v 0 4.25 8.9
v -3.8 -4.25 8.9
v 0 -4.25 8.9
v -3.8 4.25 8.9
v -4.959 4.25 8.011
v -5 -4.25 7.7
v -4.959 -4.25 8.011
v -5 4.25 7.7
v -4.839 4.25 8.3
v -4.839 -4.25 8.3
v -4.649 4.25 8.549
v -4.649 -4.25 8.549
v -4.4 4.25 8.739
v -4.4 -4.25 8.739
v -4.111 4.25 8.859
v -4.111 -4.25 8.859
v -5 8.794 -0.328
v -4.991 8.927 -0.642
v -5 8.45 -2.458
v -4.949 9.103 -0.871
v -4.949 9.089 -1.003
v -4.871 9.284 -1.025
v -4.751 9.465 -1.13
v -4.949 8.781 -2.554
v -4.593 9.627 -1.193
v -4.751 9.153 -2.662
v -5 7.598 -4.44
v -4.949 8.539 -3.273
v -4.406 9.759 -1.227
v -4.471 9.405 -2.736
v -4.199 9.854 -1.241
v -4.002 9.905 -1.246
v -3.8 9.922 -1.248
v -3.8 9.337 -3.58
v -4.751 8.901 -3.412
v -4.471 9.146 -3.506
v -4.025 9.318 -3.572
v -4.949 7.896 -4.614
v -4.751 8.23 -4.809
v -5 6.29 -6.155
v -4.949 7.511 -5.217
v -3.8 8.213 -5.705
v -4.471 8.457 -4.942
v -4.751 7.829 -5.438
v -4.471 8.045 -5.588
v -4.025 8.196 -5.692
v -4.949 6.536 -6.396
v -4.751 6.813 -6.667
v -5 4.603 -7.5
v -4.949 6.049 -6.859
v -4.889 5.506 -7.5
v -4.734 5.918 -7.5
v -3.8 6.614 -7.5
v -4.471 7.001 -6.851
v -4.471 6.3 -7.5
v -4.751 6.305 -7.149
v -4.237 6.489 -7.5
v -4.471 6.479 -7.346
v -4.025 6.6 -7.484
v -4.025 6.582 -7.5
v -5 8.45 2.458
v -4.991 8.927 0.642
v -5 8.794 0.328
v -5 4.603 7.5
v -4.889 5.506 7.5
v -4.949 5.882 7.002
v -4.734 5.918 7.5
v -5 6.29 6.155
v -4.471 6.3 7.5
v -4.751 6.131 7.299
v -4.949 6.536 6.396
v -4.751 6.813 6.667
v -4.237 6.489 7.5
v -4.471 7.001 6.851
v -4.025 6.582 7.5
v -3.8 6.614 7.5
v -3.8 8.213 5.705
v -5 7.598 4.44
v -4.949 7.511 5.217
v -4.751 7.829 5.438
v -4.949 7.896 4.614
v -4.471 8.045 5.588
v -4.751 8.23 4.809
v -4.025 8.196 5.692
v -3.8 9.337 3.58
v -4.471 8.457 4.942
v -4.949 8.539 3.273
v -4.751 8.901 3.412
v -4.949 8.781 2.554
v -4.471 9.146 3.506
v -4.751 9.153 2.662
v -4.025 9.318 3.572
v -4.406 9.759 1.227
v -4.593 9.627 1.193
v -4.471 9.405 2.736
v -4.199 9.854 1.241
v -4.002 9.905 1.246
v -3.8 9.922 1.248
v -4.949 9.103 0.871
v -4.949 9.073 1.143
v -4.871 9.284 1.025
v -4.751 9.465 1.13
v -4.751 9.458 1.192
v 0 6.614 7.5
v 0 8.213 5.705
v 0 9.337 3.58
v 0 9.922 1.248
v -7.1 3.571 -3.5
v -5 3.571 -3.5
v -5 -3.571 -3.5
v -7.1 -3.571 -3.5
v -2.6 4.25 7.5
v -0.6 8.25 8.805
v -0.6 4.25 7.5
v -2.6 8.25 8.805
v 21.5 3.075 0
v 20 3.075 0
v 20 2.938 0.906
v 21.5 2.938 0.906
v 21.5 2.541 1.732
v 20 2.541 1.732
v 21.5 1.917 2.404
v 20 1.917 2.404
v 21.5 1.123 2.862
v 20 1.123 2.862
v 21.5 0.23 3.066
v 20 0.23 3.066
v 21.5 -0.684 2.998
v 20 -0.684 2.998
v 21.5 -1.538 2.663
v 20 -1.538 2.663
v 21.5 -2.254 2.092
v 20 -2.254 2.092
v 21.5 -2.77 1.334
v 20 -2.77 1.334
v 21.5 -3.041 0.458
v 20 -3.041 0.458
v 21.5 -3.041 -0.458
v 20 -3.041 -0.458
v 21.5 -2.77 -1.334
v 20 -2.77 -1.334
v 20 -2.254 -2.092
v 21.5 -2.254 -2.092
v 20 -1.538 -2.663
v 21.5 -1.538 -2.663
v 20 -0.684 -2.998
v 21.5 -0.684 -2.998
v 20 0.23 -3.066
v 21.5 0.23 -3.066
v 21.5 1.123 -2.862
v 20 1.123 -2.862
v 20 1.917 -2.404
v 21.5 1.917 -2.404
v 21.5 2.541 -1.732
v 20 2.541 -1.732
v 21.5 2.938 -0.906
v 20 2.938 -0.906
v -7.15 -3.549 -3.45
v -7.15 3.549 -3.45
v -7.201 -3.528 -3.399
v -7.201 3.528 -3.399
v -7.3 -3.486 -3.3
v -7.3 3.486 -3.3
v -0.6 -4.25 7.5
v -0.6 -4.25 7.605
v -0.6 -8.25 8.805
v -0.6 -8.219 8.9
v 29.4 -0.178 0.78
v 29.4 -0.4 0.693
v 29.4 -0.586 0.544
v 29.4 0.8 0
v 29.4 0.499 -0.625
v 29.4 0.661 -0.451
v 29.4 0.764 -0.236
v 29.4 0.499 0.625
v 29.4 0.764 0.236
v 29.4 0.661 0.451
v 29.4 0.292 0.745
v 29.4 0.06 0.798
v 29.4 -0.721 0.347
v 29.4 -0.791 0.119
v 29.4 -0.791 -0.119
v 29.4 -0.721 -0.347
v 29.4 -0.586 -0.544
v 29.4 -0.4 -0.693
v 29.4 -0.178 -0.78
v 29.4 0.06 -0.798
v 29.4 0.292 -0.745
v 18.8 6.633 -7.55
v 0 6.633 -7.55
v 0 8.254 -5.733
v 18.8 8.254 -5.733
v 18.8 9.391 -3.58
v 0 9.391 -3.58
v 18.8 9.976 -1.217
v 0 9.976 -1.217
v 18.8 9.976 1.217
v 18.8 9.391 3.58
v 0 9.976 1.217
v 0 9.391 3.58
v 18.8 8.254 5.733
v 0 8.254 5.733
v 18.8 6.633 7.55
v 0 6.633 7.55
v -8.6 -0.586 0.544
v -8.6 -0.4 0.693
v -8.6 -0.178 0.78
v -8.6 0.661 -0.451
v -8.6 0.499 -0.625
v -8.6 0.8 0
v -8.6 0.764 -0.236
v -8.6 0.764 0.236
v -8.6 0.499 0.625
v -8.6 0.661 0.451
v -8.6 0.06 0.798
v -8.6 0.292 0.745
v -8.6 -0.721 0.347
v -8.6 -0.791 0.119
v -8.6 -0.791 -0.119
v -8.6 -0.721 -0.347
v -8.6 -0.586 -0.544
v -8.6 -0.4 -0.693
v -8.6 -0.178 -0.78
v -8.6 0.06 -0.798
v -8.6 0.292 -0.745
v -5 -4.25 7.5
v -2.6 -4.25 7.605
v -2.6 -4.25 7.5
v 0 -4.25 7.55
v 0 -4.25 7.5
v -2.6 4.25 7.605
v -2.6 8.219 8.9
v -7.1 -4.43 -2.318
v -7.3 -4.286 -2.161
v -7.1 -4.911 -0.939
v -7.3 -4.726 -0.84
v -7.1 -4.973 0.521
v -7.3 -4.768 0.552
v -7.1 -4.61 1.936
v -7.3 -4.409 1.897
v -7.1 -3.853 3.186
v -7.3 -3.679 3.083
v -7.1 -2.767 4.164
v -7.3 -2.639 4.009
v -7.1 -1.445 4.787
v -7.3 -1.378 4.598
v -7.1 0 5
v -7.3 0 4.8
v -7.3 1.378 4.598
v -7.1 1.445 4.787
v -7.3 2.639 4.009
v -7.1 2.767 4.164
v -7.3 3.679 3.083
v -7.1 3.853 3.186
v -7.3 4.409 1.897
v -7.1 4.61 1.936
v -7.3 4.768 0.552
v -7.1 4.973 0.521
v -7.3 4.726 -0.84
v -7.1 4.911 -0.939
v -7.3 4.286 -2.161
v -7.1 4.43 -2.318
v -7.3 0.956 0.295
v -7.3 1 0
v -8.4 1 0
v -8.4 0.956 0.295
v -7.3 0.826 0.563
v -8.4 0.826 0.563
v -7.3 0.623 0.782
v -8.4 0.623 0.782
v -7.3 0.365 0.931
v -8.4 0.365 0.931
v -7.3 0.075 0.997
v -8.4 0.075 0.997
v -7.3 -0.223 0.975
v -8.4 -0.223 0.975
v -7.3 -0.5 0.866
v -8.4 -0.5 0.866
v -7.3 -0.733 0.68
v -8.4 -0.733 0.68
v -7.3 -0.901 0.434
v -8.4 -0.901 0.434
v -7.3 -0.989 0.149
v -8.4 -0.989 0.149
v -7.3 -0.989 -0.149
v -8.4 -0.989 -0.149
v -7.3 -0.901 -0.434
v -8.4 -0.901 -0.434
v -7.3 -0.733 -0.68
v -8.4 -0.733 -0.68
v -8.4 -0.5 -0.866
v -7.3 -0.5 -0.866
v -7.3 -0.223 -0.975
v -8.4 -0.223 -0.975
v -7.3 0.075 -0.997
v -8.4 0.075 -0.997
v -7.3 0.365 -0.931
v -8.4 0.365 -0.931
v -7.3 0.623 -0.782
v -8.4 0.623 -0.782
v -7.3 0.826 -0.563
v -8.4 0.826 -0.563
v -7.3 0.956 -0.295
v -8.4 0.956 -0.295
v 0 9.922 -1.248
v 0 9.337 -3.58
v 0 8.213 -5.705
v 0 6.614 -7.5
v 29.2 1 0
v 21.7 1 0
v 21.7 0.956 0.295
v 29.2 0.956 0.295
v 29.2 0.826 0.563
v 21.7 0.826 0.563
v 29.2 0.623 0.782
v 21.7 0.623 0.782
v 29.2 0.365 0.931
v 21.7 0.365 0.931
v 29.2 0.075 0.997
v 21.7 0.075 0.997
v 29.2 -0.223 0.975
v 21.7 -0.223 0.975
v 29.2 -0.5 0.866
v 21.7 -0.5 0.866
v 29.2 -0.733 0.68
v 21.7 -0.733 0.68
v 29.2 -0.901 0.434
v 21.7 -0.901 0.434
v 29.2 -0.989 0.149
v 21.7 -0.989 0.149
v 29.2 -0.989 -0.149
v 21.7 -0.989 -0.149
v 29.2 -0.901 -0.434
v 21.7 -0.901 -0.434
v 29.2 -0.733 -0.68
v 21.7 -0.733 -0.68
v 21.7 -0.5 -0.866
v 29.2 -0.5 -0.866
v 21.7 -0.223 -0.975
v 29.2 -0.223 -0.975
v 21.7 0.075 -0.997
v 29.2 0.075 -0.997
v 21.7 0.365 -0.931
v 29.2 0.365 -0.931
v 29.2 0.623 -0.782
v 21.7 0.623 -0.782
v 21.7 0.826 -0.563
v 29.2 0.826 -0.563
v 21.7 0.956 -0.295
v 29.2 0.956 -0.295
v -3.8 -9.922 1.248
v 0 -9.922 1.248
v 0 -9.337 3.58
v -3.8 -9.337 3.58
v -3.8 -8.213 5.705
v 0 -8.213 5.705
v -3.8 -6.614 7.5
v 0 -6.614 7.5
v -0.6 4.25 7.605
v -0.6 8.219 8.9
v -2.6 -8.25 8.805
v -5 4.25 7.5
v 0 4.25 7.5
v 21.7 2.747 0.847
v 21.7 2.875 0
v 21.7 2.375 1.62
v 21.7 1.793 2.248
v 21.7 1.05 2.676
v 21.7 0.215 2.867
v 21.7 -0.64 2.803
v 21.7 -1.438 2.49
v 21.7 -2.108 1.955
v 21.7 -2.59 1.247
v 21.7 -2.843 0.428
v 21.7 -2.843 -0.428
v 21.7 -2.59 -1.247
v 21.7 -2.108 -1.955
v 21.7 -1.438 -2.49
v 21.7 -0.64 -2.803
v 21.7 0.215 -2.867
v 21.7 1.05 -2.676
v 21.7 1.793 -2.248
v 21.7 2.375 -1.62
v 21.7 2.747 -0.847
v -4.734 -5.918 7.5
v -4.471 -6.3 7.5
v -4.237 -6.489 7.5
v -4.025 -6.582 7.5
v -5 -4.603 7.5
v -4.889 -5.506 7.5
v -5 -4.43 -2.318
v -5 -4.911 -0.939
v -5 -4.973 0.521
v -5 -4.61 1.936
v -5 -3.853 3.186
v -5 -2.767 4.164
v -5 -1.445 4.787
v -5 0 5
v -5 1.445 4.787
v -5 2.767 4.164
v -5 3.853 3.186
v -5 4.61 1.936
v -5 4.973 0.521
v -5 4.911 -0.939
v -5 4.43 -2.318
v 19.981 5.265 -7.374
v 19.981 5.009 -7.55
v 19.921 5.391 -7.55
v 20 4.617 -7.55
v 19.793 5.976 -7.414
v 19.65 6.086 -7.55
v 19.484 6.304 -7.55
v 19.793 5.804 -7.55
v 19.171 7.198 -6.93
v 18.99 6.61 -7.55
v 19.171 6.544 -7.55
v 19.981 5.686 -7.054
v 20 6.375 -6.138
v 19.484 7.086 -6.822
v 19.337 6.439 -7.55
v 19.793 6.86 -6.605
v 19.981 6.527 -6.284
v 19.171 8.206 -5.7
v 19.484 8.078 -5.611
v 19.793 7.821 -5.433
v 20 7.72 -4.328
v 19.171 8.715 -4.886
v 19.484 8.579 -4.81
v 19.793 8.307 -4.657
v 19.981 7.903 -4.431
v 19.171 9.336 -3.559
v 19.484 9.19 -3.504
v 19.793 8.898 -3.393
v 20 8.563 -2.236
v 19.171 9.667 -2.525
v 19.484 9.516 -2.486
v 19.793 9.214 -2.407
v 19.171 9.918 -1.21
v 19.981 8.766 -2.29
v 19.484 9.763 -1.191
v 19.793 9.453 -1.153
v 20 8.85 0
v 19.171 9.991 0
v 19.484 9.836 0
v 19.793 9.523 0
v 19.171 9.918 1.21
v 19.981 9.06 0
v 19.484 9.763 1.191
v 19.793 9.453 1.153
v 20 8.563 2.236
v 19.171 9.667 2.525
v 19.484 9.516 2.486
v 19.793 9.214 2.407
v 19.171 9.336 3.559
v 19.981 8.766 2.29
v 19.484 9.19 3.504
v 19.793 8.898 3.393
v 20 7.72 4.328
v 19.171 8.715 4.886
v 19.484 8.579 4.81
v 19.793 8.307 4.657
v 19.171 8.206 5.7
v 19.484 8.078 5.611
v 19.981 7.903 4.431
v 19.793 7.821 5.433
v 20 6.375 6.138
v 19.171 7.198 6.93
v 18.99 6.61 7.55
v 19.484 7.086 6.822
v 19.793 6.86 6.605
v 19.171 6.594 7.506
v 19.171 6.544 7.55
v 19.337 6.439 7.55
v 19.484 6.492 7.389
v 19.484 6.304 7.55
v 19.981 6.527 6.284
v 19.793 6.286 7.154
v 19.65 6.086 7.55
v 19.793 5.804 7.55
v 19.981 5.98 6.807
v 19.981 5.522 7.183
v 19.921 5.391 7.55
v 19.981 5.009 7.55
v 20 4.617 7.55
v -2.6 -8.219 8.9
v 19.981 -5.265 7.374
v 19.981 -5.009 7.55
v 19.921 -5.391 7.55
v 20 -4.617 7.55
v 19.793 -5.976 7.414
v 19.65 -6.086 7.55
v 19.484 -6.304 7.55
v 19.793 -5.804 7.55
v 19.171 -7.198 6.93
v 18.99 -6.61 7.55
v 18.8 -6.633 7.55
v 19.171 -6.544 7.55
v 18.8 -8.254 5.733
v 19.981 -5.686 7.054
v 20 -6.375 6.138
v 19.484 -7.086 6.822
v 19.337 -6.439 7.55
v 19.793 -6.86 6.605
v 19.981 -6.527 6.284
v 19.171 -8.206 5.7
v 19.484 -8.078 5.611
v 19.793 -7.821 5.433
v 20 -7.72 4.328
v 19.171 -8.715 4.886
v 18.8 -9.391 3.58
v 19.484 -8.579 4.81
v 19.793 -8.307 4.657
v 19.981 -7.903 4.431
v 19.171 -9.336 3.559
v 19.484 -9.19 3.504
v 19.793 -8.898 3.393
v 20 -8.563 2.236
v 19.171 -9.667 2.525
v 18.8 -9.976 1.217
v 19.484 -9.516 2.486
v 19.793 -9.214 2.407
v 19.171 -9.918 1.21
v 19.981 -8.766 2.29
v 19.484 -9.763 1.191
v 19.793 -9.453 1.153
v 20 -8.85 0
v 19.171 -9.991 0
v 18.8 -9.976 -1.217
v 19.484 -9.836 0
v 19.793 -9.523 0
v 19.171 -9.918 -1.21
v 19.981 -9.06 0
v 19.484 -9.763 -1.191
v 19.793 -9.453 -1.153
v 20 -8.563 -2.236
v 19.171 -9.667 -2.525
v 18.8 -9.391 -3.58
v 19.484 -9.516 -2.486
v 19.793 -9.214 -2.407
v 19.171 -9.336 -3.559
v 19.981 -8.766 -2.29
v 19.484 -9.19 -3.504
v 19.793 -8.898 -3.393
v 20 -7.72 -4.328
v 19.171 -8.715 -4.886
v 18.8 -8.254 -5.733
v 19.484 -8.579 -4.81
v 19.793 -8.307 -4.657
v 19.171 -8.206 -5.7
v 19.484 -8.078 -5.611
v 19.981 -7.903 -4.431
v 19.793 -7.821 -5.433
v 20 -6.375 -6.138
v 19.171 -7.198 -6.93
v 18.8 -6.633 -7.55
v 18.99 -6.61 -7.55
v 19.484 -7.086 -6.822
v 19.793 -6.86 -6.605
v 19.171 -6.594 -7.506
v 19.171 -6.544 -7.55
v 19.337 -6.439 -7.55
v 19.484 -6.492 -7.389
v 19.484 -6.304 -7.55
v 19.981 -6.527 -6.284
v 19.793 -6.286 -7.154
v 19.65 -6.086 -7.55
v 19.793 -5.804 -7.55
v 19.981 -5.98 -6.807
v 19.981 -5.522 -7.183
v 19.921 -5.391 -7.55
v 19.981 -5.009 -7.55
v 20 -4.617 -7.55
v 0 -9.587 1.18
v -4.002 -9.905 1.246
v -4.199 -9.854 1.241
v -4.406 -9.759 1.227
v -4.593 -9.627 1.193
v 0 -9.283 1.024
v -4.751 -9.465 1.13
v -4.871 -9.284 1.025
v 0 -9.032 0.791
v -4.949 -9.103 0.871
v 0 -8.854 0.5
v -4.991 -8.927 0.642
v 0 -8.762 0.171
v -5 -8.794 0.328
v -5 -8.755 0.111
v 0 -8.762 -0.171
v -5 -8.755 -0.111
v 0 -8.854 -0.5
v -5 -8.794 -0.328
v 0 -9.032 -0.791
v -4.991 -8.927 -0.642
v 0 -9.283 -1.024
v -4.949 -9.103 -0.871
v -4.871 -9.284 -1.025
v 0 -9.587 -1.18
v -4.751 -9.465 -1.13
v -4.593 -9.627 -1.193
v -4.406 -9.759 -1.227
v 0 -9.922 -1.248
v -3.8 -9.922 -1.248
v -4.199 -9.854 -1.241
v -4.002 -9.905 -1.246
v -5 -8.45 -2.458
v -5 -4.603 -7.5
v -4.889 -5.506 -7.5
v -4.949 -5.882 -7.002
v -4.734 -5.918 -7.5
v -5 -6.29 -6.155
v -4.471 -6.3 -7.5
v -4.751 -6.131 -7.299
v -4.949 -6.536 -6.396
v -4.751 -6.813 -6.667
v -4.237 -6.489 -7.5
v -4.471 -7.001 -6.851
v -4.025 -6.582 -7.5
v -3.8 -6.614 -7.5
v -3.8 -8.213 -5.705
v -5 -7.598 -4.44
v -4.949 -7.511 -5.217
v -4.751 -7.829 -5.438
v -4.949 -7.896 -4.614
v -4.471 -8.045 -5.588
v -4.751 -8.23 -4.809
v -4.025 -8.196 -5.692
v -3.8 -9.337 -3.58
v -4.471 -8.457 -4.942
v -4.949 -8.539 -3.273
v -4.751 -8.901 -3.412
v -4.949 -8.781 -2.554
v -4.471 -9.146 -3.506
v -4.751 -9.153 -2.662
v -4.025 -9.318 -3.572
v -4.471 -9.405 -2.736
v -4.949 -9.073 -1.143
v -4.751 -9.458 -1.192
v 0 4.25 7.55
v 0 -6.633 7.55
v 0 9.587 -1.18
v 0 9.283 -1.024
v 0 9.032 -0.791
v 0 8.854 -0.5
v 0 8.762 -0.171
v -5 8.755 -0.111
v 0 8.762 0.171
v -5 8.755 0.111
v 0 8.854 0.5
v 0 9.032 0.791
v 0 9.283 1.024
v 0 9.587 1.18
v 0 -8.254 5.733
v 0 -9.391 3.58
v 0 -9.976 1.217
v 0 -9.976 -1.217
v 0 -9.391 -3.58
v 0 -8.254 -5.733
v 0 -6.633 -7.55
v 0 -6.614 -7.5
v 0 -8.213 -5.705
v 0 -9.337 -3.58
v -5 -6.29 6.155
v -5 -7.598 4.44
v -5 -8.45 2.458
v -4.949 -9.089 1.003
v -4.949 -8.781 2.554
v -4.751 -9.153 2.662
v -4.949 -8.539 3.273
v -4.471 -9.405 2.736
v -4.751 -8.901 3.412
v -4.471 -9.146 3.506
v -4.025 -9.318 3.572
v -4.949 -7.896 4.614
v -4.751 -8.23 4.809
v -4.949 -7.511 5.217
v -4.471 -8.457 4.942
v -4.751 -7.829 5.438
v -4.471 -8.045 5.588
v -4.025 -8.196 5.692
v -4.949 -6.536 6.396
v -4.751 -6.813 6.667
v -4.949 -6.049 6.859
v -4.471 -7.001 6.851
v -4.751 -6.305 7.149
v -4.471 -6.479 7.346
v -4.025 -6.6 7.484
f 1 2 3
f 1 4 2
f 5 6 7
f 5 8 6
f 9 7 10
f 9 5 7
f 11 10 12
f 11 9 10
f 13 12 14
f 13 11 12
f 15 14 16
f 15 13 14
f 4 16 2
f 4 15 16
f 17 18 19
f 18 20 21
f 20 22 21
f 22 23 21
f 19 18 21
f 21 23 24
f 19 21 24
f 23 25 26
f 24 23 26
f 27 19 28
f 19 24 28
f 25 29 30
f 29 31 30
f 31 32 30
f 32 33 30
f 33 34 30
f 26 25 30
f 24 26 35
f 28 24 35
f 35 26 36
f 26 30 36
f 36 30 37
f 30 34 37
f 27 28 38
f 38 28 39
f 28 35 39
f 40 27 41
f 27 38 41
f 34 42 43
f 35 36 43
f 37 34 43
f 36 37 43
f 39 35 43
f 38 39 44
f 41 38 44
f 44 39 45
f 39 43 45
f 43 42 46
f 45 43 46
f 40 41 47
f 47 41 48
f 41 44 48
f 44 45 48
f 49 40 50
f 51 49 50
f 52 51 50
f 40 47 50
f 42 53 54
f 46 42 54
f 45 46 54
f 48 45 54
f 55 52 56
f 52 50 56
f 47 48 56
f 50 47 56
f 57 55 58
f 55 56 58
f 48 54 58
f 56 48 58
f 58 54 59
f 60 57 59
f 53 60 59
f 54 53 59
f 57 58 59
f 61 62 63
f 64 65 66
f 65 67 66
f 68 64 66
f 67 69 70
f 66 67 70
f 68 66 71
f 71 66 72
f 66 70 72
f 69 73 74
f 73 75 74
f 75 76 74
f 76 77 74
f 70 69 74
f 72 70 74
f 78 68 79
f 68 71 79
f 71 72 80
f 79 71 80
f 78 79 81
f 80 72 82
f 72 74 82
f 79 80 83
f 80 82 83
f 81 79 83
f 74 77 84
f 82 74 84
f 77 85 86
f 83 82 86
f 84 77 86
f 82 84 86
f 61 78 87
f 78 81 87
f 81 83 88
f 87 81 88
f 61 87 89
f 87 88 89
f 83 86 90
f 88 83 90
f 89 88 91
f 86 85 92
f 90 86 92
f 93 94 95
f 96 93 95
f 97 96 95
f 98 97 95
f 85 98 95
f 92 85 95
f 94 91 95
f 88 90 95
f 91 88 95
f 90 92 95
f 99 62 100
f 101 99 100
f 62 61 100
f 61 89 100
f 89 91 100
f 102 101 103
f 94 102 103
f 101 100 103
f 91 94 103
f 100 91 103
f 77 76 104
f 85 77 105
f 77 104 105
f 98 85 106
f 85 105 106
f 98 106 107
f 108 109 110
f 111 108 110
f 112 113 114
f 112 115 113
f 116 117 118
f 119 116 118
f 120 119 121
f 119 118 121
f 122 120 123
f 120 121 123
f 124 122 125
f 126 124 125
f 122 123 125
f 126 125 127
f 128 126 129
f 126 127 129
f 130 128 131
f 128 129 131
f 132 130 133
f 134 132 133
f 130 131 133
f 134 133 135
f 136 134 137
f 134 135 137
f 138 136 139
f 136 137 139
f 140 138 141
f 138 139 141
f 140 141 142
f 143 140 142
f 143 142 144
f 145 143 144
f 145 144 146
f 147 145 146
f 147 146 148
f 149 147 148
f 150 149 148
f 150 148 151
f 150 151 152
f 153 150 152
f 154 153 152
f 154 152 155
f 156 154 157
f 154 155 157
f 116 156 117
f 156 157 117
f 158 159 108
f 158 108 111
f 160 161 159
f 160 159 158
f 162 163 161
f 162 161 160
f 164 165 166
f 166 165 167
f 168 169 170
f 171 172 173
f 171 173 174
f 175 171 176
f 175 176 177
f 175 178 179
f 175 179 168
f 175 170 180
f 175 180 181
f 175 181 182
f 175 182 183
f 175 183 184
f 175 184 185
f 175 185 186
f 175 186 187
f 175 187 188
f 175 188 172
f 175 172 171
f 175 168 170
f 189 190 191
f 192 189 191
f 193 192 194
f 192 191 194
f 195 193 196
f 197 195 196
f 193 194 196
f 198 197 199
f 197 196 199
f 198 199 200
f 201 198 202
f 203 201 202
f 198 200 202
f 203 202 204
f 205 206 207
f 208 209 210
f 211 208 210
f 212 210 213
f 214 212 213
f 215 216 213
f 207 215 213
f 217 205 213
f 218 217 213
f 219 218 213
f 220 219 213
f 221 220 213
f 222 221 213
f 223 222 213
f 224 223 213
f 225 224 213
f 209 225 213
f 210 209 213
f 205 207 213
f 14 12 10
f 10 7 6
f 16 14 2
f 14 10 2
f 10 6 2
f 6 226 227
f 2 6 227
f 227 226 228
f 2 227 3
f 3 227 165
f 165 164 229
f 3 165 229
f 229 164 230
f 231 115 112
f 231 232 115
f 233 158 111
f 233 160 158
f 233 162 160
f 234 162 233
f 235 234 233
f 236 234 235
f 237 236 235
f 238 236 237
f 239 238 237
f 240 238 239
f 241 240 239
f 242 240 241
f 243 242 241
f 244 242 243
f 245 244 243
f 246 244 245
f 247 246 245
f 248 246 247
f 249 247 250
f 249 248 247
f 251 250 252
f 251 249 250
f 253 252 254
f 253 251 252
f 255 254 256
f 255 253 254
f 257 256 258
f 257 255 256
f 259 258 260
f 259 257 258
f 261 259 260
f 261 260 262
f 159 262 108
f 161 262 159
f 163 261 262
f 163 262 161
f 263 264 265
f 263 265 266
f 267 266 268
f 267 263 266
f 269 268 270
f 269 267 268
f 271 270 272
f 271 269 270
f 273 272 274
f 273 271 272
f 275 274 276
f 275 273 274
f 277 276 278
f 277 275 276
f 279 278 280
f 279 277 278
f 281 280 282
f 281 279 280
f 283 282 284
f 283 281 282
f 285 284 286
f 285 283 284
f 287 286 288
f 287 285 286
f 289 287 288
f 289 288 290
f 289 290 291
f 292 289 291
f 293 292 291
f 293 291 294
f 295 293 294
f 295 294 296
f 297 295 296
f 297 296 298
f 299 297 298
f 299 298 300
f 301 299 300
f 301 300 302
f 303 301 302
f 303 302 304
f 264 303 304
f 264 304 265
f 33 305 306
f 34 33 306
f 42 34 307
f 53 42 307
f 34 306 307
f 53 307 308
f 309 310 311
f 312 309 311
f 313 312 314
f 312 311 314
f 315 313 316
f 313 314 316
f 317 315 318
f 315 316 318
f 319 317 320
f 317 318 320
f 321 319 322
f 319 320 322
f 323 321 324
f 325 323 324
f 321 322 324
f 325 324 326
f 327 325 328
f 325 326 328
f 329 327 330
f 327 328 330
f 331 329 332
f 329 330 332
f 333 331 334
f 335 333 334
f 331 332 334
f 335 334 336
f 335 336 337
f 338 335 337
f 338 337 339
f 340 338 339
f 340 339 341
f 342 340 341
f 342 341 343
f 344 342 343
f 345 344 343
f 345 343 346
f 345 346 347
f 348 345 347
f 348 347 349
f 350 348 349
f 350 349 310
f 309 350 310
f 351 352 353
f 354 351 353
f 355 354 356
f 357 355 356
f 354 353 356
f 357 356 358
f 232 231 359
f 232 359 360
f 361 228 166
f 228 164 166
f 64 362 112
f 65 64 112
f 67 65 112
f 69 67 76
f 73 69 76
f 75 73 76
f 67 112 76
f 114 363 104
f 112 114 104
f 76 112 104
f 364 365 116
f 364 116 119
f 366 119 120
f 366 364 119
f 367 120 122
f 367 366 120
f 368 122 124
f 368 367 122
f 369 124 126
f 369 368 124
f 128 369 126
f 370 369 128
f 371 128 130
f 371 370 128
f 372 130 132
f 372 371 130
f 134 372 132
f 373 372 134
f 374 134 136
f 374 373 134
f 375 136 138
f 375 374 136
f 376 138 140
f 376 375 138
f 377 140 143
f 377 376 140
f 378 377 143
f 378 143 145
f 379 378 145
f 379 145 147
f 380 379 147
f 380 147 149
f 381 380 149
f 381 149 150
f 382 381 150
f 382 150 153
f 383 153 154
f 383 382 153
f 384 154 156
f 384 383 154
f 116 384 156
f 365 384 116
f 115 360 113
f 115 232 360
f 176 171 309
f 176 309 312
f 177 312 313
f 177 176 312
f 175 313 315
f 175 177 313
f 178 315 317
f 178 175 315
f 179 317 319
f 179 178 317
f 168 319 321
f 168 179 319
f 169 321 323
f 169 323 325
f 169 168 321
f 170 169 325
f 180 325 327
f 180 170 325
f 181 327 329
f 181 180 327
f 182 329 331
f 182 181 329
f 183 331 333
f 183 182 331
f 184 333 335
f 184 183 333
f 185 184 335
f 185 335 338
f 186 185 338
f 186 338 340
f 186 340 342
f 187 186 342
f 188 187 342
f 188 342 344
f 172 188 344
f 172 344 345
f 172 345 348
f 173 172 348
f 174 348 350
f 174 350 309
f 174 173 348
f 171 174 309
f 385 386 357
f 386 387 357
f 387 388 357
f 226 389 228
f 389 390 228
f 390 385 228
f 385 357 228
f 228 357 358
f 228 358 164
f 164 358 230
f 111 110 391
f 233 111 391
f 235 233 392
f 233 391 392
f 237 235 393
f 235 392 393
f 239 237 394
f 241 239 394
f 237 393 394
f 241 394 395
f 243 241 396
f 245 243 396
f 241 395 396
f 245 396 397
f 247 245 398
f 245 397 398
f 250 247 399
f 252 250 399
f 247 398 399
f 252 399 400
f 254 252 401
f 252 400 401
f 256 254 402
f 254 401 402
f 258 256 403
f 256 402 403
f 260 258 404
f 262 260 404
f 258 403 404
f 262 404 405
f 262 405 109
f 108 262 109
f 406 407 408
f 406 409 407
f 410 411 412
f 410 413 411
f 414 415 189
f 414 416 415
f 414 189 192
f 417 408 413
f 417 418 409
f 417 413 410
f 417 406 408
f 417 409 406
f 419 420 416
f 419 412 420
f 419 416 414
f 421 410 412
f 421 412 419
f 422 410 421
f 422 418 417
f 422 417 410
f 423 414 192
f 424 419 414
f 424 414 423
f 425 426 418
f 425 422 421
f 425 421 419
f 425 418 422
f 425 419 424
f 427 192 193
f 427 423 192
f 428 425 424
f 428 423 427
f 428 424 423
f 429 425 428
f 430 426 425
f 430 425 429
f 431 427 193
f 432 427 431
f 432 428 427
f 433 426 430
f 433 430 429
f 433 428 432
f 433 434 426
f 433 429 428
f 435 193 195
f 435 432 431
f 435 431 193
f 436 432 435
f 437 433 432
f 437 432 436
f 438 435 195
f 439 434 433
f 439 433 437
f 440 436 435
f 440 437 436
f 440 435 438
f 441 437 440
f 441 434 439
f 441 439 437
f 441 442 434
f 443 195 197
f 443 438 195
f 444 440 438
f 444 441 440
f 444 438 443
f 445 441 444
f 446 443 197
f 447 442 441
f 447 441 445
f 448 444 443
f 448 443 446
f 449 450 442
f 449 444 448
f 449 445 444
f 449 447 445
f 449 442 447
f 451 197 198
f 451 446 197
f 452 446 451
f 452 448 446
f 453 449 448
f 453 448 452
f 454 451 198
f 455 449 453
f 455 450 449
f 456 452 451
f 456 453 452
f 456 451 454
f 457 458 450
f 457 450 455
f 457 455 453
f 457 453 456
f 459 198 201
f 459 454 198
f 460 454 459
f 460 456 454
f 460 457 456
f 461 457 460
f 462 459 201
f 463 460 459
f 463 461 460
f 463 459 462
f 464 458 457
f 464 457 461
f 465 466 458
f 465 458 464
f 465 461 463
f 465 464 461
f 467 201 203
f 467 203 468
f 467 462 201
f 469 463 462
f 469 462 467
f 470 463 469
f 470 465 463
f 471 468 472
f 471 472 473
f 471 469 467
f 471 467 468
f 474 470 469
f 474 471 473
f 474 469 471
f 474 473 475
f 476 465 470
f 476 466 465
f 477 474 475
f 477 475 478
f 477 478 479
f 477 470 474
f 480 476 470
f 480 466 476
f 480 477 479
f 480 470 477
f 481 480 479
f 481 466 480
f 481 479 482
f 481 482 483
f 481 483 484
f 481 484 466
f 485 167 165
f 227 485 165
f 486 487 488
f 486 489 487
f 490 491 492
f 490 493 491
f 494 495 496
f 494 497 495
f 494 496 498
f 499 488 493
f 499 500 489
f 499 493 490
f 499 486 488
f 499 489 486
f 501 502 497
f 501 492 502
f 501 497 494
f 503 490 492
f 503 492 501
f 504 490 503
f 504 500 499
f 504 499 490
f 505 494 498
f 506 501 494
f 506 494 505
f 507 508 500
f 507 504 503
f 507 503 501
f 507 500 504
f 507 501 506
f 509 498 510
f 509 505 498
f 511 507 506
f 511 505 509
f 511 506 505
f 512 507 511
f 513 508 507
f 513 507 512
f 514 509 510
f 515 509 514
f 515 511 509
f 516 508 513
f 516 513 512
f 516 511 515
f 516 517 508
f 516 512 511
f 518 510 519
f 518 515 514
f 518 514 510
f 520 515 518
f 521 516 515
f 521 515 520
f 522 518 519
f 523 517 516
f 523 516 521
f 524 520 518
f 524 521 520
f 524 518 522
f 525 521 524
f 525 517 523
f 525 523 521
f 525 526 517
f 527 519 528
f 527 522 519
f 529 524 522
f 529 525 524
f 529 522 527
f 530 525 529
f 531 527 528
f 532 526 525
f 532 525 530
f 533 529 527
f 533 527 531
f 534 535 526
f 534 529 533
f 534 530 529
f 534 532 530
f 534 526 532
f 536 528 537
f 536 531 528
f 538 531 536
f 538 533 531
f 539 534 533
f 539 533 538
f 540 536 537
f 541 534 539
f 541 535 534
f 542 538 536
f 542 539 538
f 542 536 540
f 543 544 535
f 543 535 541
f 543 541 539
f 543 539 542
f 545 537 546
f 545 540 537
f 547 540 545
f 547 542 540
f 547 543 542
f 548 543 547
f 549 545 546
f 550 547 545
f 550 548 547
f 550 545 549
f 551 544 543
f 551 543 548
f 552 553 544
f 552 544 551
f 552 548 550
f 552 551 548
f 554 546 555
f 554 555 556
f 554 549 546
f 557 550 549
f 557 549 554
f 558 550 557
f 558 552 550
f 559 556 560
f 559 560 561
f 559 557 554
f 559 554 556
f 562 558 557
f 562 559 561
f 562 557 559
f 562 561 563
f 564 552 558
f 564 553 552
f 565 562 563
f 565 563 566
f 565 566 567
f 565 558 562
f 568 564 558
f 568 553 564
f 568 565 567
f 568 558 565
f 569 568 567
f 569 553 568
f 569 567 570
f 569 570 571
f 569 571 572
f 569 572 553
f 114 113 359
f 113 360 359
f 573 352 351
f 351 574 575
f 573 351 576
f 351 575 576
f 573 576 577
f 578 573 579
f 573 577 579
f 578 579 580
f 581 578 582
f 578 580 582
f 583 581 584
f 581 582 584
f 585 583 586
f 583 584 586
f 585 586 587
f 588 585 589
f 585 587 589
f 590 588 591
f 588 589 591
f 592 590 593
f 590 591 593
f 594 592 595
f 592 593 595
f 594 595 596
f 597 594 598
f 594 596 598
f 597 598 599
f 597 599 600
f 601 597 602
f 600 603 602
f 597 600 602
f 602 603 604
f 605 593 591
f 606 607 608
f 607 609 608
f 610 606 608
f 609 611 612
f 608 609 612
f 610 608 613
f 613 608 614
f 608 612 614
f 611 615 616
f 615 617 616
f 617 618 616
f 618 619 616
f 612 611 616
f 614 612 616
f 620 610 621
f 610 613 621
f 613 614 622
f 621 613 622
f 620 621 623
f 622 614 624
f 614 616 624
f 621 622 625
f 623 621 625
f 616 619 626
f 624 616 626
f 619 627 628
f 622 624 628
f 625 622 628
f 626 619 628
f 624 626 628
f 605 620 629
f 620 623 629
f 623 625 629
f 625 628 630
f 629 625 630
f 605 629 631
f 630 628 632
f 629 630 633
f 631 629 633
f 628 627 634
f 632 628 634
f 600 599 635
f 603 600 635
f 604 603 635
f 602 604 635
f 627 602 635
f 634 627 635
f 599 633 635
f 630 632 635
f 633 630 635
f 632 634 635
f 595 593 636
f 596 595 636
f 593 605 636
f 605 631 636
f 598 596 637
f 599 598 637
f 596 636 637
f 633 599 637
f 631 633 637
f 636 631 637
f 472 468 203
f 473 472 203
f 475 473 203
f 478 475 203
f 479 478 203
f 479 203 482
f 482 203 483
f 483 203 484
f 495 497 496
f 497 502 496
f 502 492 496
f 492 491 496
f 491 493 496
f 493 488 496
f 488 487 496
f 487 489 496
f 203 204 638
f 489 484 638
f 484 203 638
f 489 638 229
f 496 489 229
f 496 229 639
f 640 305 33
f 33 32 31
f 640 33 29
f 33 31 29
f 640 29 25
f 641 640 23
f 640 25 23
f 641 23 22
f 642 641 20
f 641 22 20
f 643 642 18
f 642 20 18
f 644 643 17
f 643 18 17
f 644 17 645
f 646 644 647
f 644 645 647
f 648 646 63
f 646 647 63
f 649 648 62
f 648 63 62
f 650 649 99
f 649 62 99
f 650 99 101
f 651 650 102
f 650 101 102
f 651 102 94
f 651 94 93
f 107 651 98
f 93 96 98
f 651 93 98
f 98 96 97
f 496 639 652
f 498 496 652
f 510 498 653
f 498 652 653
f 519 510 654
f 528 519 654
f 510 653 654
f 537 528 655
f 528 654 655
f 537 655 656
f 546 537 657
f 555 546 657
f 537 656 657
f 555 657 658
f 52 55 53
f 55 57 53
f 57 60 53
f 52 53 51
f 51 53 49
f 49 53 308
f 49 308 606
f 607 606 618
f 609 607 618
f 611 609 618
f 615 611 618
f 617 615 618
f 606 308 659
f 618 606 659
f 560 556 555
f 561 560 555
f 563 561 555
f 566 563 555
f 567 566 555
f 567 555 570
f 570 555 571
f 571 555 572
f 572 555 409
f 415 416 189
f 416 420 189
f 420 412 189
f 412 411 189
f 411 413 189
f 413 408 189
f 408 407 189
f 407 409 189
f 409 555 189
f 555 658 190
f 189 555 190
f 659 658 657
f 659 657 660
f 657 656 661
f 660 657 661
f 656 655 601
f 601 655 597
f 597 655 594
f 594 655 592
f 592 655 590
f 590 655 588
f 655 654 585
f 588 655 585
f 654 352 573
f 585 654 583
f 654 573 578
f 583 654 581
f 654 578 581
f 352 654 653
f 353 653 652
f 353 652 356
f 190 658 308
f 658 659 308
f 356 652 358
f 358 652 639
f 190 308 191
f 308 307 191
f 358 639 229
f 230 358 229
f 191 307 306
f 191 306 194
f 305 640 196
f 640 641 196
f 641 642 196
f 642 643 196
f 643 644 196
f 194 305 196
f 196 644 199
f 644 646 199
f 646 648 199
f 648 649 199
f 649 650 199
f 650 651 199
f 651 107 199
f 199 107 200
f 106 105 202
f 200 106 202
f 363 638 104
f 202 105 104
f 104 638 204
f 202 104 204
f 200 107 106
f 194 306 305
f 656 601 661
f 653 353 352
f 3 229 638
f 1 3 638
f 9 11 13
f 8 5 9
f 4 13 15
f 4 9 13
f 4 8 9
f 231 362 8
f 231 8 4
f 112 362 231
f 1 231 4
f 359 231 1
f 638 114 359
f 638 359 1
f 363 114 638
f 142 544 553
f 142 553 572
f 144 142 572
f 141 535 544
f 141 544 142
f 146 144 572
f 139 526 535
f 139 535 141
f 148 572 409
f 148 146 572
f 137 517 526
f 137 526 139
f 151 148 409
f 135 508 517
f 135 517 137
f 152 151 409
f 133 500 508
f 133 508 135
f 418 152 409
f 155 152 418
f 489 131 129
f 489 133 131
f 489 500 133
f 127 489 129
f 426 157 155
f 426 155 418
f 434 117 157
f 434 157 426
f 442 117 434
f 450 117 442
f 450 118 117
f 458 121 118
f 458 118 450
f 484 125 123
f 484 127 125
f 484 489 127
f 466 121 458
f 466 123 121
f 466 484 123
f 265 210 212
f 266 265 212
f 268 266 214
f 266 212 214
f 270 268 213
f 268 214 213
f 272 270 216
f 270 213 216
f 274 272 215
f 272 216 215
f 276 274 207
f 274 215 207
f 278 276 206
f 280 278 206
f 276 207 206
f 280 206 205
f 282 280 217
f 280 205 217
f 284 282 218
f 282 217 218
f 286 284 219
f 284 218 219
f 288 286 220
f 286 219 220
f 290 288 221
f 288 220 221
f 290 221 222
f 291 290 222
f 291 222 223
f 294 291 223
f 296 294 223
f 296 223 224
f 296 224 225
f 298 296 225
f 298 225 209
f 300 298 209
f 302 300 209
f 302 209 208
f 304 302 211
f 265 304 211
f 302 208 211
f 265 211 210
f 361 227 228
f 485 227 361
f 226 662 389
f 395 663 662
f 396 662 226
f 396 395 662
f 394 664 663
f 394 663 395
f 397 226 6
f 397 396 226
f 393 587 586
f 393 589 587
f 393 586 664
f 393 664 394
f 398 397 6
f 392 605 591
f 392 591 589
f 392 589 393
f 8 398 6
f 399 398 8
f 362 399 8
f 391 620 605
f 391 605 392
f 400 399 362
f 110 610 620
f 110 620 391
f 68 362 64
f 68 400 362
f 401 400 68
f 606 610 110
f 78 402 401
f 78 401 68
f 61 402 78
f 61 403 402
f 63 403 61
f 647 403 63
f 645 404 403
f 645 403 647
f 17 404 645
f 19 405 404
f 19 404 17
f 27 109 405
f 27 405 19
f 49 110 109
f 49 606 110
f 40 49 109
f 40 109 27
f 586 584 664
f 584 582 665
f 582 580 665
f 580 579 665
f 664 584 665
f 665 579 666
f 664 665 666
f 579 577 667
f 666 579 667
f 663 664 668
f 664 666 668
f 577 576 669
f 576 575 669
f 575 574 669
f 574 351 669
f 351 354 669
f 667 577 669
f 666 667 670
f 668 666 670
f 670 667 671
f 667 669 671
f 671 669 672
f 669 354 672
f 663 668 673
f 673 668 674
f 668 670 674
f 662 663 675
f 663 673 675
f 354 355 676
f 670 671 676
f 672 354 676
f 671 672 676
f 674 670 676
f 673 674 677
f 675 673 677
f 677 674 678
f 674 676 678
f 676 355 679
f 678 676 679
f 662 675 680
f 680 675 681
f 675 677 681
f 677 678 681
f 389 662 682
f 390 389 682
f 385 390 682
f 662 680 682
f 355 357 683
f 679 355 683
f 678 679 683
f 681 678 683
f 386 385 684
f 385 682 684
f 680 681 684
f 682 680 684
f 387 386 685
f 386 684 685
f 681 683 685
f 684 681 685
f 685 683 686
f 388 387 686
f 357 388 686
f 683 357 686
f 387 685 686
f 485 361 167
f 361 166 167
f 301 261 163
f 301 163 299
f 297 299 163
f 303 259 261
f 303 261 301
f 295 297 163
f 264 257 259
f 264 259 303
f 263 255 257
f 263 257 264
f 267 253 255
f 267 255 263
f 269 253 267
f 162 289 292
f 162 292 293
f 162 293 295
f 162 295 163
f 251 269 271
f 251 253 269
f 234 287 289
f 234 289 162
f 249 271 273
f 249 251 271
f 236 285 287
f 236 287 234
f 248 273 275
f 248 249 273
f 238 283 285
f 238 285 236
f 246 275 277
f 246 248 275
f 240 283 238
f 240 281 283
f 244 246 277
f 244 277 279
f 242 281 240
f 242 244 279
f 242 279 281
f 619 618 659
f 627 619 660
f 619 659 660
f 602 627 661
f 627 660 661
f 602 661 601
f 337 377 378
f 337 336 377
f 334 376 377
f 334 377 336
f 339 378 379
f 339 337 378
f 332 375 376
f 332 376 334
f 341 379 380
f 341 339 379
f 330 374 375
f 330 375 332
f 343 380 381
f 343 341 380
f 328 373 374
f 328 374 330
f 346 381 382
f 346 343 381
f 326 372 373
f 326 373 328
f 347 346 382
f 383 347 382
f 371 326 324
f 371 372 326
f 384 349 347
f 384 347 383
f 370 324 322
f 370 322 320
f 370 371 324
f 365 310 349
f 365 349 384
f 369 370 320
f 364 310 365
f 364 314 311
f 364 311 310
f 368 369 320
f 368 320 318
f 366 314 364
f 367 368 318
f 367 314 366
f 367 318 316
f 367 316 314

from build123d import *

# Parameters (mm, degrees)
F1_DEPTH       = 20
F2_R           = 3.075
F3_DEPTH       = 1.7
F5_DEPTH       = 5
F6_W           = 5
F6_H           = 8.5
F7_DEPTH       = 1.4
F10_DEPTH      = 1
F12_DEPTH      = 2.3
F13_R          = 1
F14_DEPTH      = 9.4
F14_DEPTH_BACK = 28.6
F15_R          = 1.2
F16_SIZE       = 0.2
F18_DEPTH      = 5


with BuildPart() as f1:
    # F0 (on Right) → F1 (new body)
    with BuildSketch(Plane.YZ):
        with BuildLine():
            Line((6.6332495807, 7.55), (-6.6332495807, 7.55))
            ThreePointArc((-6.6332495807, 7.55), (-10.05, 0), (-6.6332495807, -7.55))
            Line((-6.6332495807, -7.55), (6.6332495807, -7.55))
            ThreePointArc((6.6332495807, -7.55), (10.05, 0), (6.6332495807, 7.55))
        make_face()
    extrude(amount=F1_DEPTH)

    # F2 (on face) → F3 (join)
    with BuildSketch(Plane.YZ.offset(20)):
        Circle(F2_R)
    extrude(amount=F3_DEPTH)

    # F4 (on face) → F5 (join)
    with BuildSketch(Plane(origin=(0, 0, 0), x_dir=(0, -1, 0), z_dir=(-1, 0, 0))):
        with BuildLine():
            Line((6.6143782777, 7.5), (-6.6143782777, 7.5))
            ThreePointArc((-6.6143782777, 7.5), (-10, 0), (-6.6143782777, -7.5))
            Line((-6.6143782777, -7.5), (6.6143782777, -7.5))
            ThreePointArc((6.6143782777, -7.5), (10, 0), (6.6143782777, 7.5))
        make_face()
    extrude(amount=F5_DEPTH)

    # F6 (on face) → F7 (join)
    with BuildSketch(Plane.XY.offset(7.5)):
        with Locations((-2.5, 0)):
            Rectangle(F6_W, F6_H)
    extrude(amount=F7_DEPTH)

    # F9 (on offset) → F10 (join, symmetric)
    with BuildSketch(Plane(origin=(-1.6, 0, 0), x_dir=(0, -1, 0), z_dir=(-1, 0, 0))):
        Polygon((4.25, 7.6051868729), (4.25, 7.5), (8.25, 8.8049311029), (8.2189854098, 8.9), align=None)
        Polygon((-8.25, 8.8049311029), (-4.25, 7.5), (-4.25, 7.6051868729), (-8.2189854098, 8.9), align=None)
    extrude(amount=F10_DEPTH, both=True)

    # F11 (on face) → F12 (join)
    with BuildSketch(Plane(origin=(-5, 0, 0), x_dir=(0, -1, 0), z_dir=(-1, 0, 0))):
        with BuildLine():
            Line((-3.5707142143, -3.5), (3.5707142143, -3.5))
            ThreePointArc((3.5707142143, -3.5), (0, 5), (-3.5707142143, -3.5))
        make_face()
    extrude(amount=F12_DEPTH)

    # F13 (on face) → F14 (join, two sides)
    with BuildSketch(Plane.YZ.offset(20)) as f14_sk:
        Circle(F13_R)
    extrude(amount=F14_DEPTH)
    extrude(f14_sk.sketch, amount=-F14_DEPTH_BACK)

    # F15
    f15_edges = [f1.edges().sort_by_distance(p)[0] for p in [
        (-5, -10, 0),
        (-5, 10, 0),
        (-5, 0, 8.9),
        (20, -10.05, 0),
        (20, 10.05, 0),
    ]]
    fillet(f15_edges, radius=F15_R)

    # F16
    f16_edges = [f1.edges().sort_by_distance(p)[0] for p in [
        (-8.6, -1, 0),
        (-7.3, 0, 5),
        (21.7, -3.075, 0),
        (29.4, -1, 0),
        (-7.3, 0, -3.5),
    ]]
    chamfer(f16_edges, length=F16_SIZE)

    # F17 (on face) → F18 (cut)
    with BuildSketch(Plane(origin=(-5, 0, 0), x_dir=(0, -1, 0), z_dir=(-1, 0, 0))):
        with BuildLine():
            Line((12, 1.25), (10, 1.25))
            ThreePointArc((10, 1.25), (8.75, 0), (10, -1.25))
            Line((10, -1.25), (12, -1.25))
            Line((12, -1.25), (12, 1.25))
        make_face()
        with BuildLine():
            Line((-12, -1.25), (-10, -1.25))
            ThreePointArc((-10, -1.25), (-8.75, 0), (-10, 1.25))
            Line((-10, 1.25), (-12, 1.25))
            Line((-12, 1.25), (-12, -1.25))
        make_face()
    extrude(amount=-F18_DEPTH, mode=Mode.SUBTRACT)


solid = f1.part
